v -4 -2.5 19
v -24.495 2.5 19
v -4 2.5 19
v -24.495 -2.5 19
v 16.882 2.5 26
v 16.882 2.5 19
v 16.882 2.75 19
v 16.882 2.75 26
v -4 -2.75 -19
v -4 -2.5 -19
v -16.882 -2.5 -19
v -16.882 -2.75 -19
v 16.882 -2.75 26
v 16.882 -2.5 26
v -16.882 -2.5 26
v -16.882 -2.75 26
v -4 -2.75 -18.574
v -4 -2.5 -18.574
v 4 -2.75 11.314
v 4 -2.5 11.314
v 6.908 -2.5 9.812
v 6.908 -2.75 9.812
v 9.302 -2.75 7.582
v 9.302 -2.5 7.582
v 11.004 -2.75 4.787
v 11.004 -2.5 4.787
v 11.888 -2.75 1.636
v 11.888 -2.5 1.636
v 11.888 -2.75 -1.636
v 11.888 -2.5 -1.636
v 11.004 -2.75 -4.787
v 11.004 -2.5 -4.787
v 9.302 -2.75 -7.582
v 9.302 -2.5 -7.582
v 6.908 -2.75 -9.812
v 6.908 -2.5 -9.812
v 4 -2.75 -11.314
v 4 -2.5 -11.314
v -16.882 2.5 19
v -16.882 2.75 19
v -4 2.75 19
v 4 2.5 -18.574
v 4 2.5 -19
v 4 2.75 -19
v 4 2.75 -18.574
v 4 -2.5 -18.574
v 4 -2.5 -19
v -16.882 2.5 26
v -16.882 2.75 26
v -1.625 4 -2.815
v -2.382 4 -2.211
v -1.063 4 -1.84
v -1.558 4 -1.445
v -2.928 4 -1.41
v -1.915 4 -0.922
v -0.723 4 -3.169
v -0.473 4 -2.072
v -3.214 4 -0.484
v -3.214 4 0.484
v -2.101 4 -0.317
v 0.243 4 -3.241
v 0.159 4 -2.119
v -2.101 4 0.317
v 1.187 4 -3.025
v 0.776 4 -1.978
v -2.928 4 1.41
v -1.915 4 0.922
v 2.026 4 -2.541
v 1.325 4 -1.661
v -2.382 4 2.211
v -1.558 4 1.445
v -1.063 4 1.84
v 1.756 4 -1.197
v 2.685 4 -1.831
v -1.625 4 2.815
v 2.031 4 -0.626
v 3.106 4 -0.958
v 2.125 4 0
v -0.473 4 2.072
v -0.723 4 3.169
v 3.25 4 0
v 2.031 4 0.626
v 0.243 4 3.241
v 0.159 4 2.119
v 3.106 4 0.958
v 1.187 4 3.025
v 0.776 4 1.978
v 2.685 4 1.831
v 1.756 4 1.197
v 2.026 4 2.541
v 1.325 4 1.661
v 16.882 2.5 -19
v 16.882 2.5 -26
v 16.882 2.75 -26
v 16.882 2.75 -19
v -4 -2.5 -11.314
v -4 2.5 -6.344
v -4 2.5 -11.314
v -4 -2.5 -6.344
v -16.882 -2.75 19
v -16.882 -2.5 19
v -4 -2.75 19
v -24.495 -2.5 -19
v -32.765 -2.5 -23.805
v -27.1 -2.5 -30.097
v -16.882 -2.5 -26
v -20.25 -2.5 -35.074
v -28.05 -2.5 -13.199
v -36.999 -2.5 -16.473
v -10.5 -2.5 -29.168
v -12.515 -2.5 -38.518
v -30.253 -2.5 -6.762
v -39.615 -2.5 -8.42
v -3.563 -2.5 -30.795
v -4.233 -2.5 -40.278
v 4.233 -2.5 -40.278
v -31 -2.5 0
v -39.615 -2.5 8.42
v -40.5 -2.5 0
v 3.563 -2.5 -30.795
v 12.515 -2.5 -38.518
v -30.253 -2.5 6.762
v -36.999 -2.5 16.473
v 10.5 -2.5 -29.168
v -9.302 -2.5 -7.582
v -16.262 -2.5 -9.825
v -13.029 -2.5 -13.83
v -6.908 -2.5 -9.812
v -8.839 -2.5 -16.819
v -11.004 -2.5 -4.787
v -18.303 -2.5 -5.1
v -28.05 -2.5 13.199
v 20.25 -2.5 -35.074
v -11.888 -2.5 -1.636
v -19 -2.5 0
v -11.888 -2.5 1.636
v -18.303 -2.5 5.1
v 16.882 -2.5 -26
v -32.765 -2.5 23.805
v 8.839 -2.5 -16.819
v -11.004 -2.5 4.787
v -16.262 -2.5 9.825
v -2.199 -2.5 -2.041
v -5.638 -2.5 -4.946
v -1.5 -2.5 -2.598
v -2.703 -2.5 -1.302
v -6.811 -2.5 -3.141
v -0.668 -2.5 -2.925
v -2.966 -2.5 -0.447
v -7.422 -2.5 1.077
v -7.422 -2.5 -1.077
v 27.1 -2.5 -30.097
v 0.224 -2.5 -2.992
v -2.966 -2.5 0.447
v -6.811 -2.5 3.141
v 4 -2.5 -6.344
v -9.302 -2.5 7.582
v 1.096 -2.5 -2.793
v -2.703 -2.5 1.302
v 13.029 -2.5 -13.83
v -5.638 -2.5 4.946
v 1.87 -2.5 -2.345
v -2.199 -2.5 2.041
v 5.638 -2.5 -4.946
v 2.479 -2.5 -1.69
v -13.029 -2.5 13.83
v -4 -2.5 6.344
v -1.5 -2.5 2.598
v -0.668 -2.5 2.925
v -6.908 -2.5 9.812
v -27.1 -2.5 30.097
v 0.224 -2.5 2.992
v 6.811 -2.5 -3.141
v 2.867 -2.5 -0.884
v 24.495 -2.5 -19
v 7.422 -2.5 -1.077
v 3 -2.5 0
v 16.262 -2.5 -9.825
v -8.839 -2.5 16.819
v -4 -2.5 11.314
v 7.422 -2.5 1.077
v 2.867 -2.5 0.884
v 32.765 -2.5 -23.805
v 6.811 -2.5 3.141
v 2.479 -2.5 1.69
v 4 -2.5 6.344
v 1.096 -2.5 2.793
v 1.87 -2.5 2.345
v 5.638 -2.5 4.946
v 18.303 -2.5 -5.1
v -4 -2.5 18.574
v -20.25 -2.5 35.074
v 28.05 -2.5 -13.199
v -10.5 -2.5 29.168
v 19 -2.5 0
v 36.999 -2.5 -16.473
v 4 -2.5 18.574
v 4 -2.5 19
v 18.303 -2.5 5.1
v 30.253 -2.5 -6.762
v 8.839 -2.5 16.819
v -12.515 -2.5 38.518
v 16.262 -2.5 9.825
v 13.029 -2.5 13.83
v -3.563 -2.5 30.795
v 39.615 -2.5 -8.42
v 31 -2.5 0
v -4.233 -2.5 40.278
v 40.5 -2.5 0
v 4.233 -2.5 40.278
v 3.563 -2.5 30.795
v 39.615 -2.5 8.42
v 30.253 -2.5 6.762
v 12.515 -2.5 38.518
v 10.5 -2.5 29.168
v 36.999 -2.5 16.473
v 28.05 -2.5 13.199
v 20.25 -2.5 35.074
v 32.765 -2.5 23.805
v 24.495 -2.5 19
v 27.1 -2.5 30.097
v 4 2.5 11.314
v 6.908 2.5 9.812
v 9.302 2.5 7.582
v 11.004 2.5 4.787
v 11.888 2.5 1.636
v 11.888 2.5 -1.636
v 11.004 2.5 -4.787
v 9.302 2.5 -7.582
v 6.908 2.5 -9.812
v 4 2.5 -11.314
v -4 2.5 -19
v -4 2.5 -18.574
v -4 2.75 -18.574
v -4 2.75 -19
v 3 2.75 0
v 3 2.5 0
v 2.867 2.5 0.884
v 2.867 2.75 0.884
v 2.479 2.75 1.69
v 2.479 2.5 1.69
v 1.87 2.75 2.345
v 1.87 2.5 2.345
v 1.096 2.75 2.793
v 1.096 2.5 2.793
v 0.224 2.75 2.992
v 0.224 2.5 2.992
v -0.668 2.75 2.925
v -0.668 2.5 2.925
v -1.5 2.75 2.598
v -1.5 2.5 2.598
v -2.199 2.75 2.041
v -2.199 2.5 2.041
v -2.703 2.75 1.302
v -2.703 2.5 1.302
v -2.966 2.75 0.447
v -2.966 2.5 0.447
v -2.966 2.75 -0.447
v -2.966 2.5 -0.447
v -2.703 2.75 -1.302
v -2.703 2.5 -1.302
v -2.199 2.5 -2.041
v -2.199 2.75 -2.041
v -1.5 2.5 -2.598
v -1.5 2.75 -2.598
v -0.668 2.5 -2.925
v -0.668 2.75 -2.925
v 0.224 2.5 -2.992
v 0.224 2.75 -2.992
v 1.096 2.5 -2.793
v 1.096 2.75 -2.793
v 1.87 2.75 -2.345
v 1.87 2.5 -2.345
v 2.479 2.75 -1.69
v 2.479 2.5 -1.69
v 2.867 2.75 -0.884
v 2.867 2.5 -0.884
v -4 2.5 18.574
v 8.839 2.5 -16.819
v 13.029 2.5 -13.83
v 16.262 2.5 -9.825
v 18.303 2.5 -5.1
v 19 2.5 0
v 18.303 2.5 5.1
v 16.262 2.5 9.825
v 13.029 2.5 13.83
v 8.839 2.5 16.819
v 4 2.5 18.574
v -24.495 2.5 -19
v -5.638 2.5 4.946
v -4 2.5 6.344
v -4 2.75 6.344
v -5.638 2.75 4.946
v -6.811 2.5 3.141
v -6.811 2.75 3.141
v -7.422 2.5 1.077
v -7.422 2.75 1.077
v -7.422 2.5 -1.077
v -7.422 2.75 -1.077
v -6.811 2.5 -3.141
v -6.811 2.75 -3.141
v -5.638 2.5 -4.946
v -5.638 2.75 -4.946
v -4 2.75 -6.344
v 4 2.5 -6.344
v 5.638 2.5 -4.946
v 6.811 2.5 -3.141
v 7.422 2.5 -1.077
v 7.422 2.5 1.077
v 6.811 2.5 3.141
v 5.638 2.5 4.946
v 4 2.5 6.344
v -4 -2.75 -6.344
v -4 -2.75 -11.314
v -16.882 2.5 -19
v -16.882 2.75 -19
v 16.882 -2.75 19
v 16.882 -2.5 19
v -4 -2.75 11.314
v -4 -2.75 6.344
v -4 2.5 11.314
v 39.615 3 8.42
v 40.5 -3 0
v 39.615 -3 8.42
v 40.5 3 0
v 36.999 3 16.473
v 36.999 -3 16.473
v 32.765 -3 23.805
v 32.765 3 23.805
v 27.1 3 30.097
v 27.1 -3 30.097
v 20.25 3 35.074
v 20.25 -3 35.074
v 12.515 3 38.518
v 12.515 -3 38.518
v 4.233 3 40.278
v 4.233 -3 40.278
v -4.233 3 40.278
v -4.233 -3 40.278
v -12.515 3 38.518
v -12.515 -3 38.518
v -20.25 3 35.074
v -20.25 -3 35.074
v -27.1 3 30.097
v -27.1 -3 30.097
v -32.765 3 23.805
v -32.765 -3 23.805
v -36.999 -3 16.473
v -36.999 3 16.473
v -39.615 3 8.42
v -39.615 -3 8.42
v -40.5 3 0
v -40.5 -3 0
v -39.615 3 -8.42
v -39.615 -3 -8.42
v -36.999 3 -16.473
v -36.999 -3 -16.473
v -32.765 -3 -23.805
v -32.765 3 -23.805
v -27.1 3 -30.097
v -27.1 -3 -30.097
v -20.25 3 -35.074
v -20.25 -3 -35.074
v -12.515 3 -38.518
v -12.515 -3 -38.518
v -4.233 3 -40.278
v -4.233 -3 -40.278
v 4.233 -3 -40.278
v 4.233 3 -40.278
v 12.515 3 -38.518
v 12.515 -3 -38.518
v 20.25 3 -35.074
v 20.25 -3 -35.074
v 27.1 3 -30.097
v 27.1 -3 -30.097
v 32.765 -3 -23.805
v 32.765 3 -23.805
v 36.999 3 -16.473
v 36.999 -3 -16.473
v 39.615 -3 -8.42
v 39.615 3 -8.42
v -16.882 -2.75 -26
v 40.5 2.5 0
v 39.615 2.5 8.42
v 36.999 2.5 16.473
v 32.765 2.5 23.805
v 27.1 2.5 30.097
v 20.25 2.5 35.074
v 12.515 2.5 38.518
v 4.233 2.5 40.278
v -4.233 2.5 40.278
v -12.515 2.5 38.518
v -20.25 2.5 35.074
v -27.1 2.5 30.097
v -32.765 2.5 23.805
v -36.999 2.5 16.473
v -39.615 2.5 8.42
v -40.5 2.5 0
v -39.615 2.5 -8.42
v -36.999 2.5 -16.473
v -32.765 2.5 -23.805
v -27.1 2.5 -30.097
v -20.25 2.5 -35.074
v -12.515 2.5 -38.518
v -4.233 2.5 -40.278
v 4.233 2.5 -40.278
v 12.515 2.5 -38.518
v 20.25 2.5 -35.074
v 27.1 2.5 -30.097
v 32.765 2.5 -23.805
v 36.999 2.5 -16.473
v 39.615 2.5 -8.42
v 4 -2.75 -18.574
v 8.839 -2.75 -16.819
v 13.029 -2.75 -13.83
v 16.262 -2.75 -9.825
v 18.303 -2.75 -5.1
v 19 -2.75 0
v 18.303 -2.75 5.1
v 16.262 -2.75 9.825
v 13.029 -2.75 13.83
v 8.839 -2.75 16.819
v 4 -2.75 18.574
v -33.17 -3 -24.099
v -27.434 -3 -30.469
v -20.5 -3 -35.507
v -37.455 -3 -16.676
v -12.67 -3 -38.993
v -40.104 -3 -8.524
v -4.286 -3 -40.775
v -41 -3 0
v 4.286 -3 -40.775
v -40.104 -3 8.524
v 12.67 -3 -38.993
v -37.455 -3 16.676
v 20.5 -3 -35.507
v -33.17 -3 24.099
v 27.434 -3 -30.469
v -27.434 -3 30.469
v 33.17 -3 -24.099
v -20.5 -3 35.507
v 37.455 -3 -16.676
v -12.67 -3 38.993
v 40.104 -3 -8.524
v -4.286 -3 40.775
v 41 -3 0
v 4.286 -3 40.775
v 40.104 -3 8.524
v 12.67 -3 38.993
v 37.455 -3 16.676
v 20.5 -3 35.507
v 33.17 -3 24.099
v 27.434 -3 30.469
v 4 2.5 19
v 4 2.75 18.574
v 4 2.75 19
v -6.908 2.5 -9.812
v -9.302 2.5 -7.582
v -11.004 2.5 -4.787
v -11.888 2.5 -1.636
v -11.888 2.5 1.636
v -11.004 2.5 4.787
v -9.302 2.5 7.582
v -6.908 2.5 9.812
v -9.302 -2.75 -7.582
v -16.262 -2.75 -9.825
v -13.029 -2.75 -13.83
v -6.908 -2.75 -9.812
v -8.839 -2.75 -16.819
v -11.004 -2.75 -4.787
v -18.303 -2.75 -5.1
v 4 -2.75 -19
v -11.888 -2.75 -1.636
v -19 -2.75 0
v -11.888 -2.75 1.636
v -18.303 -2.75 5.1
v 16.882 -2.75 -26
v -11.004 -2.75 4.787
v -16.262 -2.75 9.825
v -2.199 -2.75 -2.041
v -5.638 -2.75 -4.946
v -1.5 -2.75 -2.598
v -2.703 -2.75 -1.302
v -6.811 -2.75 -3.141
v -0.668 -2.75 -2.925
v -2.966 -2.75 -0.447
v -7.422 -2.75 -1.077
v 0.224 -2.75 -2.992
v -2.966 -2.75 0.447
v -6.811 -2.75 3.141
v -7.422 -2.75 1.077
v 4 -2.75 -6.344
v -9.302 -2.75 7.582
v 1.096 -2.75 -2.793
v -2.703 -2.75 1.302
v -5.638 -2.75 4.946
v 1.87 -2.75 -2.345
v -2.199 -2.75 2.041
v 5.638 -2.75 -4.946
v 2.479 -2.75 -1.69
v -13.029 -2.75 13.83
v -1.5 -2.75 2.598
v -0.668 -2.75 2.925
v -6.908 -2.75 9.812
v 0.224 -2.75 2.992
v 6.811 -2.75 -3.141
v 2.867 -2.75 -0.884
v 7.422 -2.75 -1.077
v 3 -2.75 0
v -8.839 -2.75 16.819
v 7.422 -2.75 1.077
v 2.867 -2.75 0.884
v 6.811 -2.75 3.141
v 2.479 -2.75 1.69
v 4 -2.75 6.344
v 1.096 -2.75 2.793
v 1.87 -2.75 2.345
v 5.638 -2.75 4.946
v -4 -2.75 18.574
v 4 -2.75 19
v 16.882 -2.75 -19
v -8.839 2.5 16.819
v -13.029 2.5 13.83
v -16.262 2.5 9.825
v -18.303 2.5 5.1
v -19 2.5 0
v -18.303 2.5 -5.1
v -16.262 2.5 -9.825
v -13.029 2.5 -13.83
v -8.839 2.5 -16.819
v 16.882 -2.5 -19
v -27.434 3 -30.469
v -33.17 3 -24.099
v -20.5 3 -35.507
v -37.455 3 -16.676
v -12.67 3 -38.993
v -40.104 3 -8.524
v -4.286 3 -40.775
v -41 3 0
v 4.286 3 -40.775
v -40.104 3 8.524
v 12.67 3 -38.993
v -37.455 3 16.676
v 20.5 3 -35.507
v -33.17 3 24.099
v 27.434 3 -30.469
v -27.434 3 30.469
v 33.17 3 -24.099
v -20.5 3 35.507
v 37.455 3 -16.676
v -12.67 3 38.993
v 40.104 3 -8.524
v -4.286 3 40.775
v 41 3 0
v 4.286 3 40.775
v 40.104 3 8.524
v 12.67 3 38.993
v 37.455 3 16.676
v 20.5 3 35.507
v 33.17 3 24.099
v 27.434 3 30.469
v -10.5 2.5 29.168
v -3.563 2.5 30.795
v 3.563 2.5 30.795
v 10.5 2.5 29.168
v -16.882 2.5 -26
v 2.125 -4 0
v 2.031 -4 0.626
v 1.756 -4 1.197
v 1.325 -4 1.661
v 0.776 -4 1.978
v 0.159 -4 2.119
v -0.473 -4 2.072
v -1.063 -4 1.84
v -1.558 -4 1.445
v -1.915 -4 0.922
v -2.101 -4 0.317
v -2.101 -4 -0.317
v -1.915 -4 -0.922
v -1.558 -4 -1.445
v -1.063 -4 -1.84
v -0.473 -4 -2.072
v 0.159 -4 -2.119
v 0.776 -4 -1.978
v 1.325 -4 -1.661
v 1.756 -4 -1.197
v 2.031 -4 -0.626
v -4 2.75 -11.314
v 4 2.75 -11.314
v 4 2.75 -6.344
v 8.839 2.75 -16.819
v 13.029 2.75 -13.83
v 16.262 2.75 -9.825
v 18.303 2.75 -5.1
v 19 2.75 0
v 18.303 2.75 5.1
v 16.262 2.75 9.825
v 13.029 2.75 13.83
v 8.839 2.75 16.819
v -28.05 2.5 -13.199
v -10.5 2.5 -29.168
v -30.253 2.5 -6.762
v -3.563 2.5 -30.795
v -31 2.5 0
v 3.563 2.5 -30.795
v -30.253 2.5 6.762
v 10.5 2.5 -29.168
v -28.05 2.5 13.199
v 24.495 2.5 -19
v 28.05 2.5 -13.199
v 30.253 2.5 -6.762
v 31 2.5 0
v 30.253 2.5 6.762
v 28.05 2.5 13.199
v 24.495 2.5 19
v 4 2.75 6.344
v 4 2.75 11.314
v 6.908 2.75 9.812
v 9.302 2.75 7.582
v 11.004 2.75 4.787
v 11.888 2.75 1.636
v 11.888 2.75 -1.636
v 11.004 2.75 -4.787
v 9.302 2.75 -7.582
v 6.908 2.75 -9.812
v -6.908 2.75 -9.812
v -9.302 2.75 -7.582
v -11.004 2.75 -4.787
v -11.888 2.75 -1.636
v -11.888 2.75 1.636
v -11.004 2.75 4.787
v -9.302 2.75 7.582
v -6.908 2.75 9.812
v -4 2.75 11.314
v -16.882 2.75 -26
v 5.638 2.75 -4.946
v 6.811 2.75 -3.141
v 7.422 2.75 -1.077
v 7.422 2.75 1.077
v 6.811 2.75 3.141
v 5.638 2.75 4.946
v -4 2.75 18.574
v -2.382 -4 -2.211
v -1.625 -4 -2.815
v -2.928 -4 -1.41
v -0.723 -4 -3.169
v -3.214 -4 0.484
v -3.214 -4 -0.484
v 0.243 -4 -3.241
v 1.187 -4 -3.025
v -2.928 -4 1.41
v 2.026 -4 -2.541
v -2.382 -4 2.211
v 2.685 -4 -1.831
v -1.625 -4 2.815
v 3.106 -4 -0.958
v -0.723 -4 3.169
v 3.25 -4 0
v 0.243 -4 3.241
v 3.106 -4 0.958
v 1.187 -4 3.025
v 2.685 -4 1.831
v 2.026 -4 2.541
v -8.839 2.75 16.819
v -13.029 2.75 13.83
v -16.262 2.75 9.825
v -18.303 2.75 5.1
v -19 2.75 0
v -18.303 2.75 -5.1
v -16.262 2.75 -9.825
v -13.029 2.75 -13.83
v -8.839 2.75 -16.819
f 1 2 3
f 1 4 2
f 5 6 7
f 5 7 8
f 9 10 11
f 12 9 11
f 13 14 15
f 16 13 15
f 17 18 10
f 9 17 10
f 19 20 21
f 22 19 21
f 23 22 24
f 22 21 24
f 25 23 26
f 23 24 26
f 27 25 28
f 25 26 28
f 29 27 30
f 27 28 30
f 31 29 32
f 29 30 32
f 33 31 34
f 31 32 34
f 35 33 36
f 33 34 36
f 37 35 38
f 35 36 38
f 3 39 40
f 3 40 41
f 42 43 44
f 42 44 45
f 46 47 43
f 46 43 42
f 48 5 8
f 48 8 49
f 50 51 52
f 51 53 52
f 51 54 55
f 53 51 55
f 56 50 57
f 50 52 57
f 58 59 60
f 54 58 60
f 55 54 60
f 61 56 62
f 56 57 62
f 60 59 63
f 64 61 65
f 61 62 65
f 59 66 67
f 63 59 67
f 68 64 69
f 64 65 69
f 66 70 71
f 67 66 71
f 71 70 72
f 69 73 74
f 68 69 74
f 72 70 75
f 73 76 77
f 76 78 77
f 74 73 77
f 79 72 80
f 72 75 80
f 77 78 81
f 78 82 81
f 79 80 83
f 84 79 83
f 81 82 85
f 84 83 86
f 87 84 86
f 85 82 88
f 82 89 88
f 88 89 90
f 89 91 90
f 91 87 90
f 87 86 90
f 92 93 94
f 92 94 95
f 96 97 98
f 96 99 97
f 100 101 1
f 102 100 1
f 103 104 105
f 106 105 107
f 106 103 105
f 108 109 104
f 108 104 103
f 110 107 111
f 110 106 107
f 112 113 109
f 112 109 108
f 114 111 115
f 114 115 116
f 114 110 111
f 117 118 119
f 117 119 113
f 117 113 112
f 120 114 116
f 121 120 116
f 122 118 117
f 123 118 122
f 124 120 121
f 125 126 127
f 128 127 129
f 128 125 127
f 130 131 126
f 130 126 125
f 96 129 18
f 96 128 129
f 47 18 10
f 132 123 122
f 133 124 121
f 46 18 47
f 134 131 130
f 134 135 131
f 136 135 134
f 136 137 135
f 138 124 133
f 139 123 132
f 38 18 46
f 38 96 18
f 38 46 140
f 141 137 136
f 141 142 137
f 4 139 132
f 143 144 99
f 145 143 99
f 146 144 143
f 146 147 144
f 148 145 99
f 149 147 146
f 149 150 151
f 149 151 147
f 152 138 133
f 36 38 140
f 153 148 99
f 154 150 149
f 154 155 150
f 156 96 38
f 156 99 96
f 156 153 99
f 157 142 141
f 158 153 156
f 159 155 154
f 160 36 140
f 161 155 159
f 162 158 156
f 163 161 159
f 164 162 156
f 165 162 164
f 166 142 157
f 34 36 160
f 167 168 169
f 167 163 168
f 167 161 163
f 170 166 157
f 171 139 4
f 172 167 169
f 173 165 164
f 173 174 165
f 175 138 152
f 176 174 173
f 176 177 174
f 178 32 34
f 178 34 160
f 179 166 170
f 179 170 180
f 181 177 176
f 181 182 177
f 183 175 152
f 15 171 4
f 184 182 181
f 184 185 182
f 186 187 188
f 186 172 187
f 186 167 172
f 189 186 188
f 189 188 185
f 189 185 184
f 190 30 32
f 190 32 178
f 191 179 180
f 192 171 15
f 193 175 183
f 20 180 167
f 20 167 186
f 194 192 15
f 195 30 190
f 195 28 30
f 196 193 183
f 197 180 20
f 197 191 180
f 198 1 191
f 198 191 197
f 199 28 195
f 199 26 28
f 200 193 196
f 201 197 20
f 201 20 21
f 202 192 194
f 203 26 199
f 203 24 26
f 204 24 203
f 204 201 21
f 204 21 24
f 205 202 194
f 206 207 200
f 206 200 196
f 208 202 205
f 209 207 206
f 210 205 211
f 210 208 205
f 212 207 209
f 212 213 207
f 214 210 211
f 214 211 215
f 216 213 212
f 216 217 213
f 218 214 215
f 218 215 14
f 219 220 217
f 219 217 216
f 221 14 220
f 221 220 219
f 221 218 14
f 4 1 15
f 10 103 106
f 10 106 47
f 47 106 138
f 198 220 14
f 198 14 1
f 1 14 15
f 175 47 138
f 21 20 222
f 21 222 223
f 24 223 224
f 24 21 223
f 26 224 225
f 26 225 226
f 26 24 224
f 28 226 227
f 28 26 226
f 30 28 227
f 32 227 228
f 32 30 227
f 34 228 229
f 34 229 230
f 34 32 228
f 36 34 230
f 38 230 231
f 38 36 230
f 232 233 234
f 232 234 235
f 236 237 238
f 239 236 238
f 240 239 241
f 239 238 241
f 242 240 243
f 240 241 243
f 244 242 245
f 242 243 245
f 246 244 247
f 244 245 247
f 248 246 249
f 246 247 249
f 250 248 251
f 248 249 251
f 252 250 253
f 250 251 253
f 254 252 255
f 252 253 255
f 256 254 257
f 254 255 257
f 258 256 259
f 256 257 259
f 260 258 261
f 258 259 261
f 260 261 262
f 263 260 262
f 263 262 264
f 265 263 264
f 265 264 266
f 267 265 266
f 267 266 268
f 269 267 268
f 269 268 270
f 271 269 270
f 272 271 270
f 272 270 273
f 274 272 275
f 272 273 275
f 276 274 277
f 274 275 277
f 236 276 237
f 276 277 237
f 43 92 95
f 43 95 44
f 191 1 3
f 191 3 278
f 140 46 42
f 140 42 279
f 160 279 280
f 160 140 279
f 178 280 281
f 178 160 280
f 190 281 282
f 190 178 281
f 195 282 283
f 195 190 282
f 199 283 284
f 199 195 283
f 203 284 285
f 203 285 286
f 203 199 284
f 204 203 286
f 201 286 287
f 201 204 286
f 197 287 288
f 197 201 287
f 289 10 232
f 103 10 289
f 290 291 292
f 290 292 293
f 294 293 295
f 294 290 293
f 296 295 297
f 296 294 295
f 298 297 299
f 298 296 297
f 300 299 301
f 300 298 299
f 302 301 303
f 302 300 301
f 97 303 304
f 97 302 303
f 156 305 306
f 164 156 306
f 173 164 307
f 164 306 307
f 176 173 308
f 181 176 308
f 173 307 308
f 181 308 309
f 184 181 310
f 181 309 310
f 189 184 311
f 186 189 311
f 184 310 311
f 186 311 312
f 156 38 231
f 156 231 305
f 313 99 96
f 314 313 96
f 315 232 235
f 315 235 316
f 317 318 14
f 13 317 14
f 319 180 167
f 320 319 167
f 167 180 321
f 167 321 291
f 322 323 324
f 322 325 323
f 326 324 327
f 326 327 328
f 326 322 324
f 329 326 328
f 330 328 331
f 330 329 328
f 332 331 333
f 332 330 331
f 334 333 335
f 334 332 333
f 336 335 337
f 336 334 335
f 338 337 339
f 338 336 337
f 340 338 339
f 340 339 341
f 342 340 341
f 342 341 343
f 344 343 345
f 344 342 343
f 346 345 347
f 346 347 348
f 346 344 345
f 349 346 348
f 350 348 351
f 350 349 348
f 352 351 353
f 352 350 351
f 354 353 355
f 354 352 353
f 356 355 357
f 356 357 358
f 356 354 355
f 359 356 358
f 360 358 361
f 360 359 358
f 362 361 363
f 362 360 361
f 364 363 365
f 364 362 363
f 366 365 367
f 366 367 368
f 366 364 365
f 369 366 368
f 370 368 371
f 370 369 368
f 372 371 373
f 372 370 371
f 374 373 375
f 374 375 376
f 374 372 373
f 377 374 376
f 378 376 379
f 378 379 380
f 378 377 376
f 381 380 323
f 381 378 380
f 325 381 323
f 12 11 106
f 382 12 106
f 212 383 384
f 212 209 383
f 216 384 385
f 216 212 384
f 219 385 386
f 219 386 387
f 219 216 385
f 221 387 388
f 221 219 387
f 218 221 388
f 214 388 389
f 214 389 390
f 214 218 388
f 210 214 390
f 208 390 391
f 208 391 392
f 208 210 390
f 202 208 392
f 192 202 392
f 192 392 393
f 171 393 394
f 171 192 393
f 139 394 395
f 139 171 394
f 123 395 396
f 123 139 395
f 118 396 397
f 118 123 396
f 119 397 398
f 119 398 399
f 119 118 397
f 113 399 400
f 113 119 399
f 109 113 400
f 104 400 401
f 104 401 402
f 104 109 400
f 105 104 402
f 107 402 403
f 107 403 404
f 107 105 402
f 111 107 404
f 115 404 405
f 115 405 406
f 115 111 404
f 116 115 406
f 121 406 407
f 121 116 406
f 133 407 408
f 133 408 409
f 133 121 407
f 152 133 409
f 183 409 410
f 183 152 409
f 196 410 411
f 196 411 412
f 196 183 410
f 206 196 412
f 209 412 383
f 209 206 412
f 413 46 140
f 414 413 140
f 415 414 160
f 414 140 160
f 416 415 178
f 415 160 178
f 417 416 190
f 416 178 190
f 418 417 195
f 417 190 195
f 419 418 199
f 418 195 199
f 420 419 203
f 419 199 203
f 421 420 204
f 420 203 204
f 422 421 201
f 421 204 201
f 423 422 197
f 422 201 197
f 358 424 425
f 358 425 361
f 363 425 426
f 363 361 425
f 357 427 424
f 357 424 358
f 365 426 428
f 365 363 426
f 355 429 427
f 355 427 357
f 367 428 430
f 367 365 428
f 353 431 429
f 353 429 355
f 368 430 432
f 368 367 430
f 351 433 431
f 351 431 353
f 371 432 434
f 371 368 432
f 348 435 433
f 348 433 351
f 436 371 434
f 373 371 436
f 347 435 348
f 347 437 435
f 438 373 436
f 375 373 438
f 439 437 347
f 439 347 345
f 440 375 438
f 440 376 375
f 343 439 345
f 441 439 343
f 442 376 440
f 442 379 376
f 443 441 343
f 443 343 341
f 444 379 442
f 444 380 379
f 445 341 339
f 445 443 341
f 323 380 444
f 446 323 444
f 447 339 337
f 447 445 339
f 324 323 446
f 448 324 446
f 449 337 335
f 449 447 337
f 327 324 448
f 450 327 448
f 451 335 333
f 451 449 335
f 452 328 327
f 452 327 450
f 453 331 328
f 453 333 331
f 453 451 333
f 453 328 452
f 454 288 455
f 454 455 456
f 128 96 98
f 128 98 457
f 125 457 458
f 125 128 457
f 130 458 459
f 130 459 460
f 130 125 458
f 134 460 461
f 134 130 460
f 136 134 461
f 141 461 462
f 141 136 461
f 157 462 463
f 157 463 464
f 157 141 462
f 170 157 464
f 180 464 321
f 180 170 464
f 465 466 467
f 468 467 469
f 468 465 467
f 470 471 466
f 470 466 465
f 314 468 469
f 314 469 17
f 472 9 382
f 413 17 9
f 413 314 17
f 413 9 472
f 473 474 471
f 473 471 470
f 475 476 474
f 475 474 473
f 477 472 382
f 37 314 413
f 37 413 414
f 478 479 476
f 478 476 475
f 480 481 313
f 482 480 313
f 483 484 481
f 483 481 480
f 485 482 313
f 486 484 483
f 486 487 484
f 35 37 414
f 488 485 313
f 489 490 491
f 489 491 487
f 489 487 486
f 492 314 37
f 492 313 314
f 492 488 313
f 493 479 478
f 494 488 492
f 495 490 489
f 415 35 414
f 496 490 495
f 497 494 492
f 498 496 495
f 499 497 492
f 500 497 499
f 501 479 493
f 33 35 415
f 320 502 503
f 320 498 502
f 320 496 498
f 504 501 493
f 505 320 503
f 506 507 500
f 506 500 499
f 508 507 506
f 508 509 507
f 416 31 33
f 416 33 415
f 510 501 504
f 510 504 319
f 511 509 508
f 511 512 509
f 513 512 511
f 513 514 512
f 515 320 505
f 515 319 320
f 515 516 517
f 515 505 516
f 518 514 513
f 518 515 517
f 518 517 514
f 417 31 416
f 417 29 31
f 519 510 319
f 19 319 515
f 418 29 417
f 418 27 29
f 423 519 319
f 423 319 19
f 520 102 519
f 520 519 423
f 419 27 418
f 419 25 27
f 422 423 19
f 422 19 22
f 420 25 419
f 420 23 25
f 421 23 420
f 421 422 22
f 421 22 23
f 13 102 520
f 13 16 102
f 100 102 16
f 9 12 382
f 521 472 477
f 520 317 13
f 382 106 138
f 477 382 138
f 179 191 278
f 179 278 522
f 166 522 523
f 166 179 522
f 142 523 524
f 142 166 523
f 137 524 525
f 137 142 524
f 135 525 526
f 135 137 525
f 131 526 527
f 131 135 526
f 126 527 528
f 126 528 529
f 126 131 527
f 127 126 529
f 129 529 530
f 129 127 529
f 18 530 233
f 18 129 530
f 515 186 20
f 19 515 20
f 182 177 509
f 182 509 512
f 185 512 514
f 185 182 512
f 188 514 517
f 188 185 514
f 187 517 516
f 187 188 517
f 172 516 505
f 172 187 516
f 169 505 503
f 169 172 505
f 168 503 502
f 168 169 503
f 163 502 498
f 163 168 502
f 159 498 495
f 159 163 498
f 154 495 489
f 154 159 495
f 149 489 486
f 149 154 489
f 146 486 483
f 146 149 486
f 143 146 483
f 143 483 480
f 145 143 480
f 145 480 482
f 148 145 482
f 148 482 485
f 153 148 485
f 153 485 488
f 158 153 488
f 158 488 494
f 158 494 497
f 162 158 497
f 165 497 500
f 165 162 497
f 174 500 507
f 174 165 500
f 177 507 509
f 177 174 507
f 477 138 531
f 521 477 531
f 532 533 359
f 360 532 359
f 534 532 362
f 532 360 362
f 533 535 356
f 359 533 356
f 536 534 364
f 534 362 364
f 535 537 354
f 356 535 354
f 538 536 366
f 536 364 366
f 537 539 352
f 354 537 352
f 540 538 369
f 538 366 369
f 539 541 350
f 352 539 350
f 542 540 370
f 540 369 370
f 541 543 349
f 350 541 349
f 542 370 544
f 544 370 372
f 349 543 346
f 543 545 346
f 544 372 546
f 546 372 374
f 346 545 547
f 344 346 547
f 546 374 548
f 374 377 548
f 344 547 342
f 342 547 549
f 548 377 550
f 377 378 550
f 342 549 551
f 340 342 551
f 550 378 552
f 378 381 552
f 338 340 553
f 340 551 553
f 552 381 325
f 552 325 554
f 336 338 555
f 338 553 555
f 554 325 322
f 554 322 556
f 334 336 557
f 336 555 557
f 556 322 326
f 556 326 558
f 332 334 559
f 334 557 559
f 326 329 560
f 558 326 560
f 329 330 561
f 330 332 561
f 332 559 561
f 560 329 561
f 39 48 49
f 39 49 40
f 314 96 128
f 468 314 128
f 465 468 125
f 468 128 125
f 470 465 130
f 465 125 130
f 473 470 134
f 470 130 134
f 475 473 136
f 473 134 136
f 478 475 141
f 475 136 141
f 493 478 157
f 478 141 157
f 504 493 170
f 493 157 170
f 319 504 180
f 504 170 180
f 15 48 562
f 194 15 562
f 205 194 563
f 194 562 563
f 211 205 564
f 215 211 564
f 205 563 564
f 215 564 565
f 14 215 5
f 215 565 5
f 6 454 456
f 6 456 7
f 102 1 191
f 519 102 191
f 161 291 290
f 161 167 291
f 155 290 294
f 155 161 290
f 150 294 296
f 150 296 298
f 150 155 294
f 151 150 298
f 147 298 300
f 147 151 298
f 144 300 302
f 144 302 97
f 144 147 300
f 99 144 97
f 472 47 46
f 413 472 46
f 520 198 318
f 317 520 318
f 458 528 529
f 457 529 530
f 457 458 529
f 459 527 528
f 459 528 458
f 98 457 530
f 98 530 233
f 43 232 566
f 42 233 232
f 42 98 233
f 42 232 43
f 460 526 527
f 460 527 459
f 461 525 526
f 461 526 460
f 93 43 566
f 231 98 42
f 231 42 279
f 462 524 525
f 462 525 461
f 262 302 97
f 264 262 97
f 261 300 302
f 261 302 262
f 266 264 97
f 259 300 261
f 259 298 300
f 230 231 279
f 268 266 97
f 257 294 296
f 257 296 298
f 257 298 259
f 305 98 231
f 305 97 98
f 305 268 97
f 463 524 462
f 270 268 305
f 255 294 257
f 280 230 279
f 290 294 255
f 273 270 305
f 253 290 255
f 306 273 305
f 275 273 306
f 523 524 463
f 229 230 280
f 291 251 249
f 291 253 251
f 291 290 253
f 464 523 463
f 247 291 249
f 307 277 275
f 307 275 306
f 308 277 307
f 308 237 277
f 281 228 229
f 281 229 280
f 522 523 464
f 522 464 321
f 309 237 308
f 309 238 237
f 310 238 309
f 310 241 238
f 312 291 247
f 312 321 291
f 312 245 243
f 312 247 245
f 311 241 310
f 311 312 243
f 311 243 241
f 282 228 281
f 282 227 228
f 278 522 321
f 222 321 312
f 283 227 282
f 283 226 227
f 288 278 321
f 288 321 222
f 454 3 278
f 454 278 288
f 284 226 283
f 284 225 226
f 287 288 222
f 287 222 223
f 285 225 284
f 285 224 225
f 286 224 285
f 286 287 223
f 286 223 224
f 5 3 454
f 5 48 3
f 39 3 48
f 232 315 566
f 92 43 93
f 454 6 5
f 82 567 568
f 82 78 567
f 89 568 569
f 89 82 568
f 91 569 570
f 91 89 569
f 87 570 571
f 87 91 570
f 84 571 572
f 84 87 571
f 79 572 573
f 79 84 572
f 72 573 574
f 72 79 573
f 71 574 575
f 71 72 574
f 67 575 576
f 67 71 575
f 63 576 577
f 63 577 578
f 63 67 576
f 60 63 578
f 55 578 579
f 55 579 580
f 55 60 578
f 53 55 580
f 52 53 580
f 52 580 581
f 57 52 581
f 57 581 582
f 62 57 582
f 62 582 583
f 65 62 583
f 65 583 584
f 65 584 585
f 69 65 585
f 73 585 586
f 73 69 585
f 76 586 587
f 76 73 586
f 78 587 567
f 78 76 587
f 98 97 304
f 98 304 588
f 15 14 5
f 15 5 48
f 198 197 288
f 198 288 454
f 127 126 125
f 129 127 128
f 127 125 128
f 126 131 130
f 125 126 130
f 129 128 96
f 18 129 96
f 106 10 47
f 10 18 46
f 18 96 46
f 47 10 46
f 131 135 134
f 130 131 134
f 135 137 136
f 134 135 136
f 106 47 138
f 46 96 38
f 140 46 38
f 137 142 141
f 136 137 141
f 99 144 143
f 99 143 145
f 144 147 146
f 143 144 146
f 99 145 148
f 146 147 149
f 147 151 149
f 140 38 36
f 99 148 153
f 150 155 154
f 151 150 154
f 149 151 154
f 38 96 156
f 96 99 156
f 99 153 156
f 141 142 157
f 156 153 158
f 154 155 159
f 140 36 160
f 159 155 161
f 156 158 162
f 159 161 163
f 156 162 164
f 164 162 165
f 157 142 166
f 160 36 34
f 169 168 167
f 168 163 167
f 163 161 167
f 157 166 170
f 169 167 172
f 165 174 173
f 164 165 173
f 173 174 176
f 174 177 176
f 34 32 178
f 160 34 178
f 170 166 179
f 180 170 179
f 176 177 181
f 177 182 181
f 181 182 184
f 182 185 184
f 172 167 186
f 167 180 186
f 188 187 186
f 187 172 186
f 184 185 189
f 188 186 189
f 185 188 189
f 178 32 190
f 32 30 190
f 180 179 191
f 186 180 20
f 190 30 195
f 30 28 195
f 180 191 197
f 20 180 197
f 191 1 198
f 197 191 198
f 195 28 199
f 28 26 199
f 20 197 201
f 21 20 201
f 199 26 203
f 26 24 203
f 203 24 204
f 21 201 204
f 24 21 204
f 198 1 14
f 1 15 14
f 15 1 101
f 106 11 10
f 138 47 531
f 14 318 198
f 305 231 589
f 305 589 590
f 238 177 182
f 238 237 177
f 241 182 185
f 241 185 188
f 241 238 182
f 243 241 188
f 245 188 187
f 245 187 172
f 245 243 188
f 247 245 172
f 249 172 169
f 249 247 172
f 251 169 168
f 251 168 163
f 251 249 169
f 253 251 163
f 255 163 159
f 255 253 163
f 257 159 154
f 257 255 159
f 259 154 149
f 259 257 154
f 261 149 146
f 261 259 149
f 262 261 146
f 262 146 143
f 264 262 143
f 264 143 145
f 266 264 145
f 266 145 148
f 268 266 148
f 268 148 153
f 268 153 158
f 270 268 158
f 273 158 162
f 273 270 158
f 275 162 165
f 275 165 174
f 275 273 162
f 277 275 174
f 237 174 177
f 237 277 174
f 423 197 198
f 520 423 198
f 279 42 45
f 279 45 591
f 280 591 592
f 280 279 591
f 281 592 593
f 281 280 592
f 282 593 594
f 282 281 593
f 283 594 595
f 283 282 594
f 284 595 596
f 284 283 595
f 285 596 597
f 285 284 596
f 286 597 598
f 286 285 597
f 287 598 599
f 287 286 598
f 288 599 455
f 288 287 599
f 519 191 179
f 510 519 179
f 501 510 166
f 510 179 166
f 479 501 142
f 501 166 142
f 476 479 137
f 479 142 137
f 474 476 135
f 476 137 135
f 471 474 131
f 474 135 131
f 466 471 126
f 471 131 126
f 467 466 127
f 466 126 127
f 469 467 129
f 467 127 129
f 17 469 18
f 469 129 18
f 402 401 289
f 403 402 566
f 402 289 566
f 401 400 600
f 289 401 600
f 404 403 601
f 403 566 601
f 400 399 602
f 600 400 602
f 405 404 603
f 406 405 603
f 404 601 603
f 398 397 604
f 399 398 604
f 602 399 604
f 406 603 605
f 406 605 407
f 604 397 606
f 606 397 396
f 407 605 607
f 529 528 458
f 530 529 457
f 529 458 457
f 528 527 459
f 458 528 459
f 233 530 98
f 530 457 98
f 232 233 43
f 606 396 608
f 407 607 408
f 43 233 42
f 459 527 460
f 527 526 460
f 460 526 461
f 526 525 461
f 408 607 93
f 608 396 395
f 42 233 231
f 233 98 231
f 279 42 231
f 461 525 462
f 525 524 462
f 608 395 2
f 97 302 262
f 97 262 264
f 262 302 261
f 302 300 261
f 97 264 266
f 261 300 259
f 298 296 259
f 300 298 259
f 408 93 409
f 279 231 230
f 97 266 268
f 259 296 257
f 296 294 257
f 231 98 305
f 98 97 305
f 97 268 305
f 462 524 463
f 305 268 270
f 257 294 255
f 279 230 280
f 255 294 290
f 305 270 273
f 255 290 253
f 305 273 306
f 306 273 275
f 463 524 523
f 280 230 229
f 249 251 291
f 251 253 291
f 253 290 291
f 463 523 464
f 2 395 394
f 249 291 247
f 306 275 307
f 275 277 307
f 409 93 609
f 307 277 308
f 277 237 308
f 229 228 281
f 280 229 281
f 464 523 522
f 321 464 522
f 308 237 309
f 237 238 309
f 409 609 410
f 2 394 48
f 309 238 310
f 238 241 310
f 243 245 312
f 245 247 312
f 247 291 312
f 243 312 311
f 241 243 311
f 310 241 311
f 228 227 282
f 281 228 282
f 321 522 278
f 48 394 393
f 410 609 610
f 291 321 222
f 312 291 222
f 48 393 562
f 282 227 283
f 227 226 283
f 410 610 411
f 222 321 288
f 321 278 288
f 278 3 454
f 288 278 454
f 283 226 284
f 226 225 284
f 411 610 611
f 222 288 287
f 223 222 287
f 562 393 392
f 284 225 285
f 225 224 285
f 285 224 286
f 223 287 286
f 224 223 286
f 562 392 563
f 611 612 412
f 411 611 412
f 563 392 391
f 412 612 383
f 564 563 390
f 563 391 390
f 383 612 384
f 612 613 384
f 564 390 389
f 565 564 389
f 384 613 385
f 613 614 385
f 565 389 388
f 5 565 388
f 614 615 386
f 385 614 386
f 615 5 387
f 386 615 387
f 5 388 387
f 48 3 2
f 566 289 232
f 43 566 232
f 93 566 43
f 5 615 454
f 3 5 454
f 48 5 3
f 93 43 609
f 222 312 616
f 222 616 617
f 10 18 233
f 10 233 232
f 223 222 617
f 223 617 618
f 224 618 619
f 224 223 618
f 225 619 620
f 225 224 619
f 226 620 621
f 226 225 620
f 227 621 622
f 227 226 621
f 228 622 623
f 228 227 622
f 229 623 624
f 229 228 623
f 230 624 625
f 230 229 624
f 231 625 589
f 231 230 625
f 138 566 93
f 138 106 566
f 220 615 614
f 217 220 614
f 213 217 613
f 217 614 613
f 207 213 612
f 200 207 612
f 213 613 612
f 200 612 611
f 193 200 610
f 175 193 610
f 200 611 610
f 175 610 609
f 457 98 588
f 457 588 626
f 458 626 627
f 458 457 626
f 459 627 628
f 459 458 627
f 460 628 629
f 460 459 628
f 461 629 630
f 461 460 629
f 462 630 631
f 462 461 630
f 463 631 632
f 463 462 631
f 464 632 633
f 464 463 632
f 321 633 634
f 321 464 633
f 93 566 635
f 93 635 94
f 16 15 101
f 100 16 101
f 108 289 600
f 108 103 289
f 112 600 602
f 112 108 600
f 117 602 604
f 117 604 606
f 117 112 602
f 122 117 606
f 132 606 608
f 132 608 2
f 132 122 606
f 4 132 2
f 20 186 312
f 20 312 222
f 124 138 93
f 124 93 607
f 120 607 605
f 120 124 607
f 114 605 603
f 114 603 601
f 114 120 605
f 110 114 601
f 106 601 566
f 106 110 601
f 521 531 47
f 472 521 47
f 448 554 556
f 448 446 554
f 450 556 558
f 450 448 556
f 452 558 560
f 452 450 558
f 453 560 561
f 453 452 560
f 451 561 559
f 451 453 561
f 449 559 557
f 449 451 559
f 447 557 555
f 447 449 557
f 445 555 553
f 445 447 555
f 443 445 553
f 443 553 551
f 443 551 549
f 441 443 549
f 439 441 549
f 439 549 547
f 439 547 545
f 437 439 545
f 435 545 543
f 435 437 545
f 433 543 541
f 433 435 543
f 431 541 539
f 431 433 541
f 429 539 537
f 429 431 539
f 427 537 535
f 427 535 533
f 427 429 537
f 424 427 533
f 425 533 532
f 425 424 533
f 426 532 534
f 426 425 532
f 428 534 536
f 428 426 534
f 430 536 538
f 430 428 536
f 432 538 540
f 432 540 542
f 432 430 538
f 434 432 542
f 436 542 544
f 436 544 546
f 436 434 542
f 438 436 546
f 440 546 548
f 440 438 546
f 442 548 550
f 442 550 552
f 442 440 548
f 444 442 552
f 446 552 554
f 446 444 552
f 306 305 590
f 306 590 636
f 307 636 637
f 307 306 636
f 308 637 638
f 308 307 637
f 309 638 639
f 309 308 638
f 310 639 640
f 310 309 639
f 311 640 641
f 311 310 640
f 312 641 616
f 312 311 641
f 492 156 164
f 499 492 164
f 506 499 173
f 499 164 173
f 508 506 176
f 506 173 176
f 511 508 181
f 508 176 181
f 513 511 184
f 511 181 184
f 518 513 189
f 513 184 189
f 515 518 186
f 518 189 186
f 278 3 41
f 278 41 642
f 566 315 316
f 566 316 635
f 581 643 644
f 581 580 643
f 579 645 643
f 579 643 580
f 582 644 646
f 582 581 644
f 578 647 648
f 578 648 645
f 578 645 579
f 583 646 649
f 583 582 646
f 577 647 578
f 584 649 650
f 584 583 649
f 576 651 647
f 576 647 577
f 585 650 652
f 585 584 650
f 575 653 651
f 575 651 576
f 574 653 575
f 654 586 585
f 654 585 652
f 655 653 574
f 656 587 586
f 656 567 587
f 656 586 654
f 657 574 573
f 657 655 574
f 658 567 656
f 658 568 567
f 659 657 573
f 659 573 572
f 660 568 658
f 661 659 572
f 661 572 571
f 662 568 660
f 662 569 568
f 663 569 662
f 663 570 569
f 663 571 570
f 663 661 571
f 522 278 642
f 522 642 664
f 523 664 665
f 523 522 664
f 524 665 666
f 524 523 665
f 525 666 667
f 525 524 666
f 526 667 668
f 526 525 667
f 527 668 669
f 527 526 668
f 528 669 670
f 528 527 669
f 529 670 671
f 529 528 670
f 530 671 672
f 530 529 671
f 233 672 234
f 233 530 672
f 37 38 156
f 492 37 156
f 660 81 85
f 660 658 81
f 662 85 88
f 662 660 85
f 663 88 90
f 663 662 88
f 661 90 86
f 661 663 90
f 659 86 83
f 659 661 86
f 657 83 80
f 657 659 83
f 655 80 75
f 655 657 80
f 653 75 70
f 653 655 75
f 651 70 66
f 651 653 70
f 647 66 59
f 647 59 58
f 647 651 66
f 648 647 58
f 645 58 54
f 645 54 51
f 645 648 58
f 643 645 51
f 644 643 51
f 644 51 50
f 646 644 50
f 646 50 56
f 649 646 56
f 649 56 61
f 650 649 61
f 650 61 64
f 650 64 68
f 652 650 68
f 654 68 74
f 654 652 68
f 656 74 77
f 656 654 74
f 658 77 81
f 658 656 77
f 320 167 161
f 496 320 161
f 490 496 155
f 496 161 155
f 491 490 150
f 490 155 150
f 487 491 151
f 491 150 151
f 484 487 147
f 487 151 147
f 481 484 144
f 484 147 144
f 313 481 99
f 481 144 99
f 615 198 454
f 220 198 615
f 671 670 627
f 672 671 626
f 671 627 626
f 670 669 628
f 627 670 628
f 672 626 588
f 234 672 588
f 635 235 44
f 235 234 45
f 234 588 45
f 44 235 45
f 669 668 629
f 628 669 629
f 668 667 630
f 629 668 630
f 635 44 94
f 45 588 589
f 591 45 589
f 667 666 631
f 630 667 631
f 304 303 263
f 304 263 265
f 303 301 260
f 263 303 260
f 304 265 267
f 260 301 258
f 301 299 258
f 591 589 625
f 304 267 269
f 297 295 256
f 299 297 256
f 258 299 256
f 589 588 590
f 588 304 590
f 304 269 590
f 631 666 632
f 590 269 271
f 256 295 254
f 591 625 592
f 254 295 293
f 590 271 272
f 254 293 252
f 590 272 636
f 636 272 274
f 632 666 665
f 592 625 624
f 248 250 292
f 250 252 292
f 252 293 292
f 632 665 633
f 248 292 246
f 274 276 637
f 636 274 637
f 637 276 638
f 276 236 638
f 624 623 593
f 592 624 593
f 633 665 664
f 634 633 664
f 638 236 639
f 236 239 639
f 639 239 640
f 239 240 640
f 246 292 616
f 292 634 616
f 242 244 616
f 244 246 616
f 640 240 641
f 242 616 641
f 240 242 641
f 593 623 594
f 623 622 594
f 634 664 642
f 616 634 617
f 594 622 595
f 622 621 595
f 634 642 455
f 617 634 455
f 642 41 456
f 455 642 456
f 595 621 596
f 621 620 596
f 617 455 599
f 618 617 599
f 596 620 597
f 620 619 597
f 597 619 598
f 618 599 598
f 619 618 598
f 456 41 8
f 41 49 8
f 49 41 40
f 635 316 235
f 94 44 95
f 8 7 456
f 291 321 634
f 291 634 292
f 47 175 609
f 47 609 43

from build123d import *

# Parameters (mm, degrees)
F0_R     = 40.5
F0_R_2   = 3
F1_DEPTH = 2.5
F2_R     = 41
F2_R_2   = 40.5
F3_DEPTH = 3
F4_R     = 3.25
F4_R_2   = 2.125
F5_DEPTH = 4
F6_R     = 3
F7_DEPTH = 0.25


with BuildPart() as f1:
    # F0 (on Front) → F1 (new body, symmetric)
    with BuildSketch(Plane.XZ):
        Circle(F0_R)
        with BuildLine():
            ThreePointArc((16.881943, -26), (0, -31), (-16.881943, -26))
            Line((-16.881943, -26), (16.881943, -26))
        make_face(mode=Mode.SUBTRACT)
        with BuildLine():
            Line((-4, 19), (-4, 18.574176))
            ThreePointArc((-4, 18.574176), (-19, 0), (-4, -18.574176))
            Line((-4, -18.574176), (-4, -19))
            Line((-4, -19), (-24.494897, -19))
            ThreePointArc((-24.494897, -19), (-31, 0), (-24.494897, 19))
            Line((-24.494897, 19), (-4, 19))
        make_face(mode=Mode.SUBTRACT)
        with BuildLine():
            ThreePointArc((-4, -11.313708), (-12, 0), (-4, 11.313708))
            Line((-4, 11.313708), (-4, 6.344289))
            ThreePointArc((-4, 6.344289), (-7.5, 0), (-4, -6.344289))
            Line((-4, -6.344289), (-4, -11.313708))
        make_face(mode=Mode.SUBTRACT)
        with BuildLine():
            ThreePointArc((-16.881943, 26), (0, 31), (16.881943, 26))
            Line((16.881943, 26), (-16.881943, 26))
        make_face(mode=Mode.SUBTRACT)
        Circle(F0_R_2, mode=Mode.SUBTRACT)
        with BuildLine():
            Line((4, -11.313708), (4, -6.344289))
            ThreePointArc((4, -6.344289), (7.5, 0), (4, 6.344289))
            Line((4, 6.344289), (4, 11.313708))
            ThreePointArc((4, 11.313708), (12, 0), (4, -11.313708))
        make_face(mode=Mode.SUBTRACT)
        with BuildLine():
            ThreePointArc((24.494897, 19), (31, 0), (24.494897, -19))
            Line((24.494897, -19), (4, -19))
            Line((4, -19), (4, -18.574176))
            ThreePointArc((4, -18.574176), (19, 0), (4, 18.574176))
            Line((4, 18.574176), (4, 19))
            Line((4, 19), (24.494897, 19))
        make_face(mode=Mode.SUBTRACT)
    extrude(amount=F1_DEPTH, both=True)


with BuildPart() as f3:
    # F2 (on Front) → F3 (new body, symmetric)
    with BuildSketch(Plane.XZ):
        Circle(F2_R)
        Circle(F2_R_2, mode=Mode.SUBTRACT)
    extrude(amount=F3_DEPTH, both=True)


with BuildPart() as f5:
    # F4 (on Front) → F5 (new body, symmetric)
    with BuildSketch(Plane.XZ):
        Circle(F4_R)
        Circle(F4_R_2, mode=Mode.SUBTRACT)
    extrude(amount=F5_DEPTH, both=True)


with BuildPart() as f7:
    # F6 (on face) → F7 (new body)
    with BuildSketch(Plane.XZ.offset(2.5)):
        with BuildLine():
            Line((16.881943, 26), (-16.881943, 26))
            Line((-16.881943, 26), (-16.881943, 19))
            Line((-16.881943, 19), (-4, 19))
            Line((-4, 19), (-4, 18.574176))
            ThreePointArc((-4, 18.574176), (-19, 0), (-4, -18.574176))
            Line((-4, -18.574176), (-4, -19))
            Line((-4, -19), (-16.881943, -19))
            Line((-16.881943, -19), (-16.881943, -26))
            Line((-16.881943, -26), (16.881943, -26))
            Line((16.881943, -26), (16.881943, -19))
            Line((16.881943, -19), (4, -19))
            Line((4, -19), (4, -18.574176))
            ThreePointArc((4, -18.574176), (19, 0), (4, 18.574176))
            Line((4, 18.574176), (4, 19))
            Line((4, 19), (16.881943, 19))
            Line((16.881943, 19), (16.881943, 26))
        make_face()
        with BuildLine():
            ThreePointArc((-4, -11.313708), (-12, 0), (-4, 11.313708))
            Line((-4, 11.313708), (-4, 6.344289))
            ThreePointArc((-4, 6.344289), (-7.5, 0), (-4, -6.344289))
            Line((-4, -6.344289), (-4, -11.313708))
        make_face(mode=Mode.SUBTRACT)
        Circle(F6_R, mode=Mode.SUBTRACT)
        with BuildLine():
            ThreePointArc((4, 11.313708), (12, 0), (4, -11.313708))
            Line((4, -11.313708), (4, -6.344289))
            ThreePointArc((4, -6.344289), (7.5, 0), (4, 6.344289))
            Line((4, 6.344289), (4, 11.313708))
        make_face(mode=Mode.SUBTRACT)
    extrude(amount=F7_DEPTH)


with BuildPart() as f8_1:
    # F8: instance of F7
    add(f7.part.mirror(Plane.XZ))


solid = Compound([f1.part, f3.part, f5.part, f7.part, f8_1.part])
